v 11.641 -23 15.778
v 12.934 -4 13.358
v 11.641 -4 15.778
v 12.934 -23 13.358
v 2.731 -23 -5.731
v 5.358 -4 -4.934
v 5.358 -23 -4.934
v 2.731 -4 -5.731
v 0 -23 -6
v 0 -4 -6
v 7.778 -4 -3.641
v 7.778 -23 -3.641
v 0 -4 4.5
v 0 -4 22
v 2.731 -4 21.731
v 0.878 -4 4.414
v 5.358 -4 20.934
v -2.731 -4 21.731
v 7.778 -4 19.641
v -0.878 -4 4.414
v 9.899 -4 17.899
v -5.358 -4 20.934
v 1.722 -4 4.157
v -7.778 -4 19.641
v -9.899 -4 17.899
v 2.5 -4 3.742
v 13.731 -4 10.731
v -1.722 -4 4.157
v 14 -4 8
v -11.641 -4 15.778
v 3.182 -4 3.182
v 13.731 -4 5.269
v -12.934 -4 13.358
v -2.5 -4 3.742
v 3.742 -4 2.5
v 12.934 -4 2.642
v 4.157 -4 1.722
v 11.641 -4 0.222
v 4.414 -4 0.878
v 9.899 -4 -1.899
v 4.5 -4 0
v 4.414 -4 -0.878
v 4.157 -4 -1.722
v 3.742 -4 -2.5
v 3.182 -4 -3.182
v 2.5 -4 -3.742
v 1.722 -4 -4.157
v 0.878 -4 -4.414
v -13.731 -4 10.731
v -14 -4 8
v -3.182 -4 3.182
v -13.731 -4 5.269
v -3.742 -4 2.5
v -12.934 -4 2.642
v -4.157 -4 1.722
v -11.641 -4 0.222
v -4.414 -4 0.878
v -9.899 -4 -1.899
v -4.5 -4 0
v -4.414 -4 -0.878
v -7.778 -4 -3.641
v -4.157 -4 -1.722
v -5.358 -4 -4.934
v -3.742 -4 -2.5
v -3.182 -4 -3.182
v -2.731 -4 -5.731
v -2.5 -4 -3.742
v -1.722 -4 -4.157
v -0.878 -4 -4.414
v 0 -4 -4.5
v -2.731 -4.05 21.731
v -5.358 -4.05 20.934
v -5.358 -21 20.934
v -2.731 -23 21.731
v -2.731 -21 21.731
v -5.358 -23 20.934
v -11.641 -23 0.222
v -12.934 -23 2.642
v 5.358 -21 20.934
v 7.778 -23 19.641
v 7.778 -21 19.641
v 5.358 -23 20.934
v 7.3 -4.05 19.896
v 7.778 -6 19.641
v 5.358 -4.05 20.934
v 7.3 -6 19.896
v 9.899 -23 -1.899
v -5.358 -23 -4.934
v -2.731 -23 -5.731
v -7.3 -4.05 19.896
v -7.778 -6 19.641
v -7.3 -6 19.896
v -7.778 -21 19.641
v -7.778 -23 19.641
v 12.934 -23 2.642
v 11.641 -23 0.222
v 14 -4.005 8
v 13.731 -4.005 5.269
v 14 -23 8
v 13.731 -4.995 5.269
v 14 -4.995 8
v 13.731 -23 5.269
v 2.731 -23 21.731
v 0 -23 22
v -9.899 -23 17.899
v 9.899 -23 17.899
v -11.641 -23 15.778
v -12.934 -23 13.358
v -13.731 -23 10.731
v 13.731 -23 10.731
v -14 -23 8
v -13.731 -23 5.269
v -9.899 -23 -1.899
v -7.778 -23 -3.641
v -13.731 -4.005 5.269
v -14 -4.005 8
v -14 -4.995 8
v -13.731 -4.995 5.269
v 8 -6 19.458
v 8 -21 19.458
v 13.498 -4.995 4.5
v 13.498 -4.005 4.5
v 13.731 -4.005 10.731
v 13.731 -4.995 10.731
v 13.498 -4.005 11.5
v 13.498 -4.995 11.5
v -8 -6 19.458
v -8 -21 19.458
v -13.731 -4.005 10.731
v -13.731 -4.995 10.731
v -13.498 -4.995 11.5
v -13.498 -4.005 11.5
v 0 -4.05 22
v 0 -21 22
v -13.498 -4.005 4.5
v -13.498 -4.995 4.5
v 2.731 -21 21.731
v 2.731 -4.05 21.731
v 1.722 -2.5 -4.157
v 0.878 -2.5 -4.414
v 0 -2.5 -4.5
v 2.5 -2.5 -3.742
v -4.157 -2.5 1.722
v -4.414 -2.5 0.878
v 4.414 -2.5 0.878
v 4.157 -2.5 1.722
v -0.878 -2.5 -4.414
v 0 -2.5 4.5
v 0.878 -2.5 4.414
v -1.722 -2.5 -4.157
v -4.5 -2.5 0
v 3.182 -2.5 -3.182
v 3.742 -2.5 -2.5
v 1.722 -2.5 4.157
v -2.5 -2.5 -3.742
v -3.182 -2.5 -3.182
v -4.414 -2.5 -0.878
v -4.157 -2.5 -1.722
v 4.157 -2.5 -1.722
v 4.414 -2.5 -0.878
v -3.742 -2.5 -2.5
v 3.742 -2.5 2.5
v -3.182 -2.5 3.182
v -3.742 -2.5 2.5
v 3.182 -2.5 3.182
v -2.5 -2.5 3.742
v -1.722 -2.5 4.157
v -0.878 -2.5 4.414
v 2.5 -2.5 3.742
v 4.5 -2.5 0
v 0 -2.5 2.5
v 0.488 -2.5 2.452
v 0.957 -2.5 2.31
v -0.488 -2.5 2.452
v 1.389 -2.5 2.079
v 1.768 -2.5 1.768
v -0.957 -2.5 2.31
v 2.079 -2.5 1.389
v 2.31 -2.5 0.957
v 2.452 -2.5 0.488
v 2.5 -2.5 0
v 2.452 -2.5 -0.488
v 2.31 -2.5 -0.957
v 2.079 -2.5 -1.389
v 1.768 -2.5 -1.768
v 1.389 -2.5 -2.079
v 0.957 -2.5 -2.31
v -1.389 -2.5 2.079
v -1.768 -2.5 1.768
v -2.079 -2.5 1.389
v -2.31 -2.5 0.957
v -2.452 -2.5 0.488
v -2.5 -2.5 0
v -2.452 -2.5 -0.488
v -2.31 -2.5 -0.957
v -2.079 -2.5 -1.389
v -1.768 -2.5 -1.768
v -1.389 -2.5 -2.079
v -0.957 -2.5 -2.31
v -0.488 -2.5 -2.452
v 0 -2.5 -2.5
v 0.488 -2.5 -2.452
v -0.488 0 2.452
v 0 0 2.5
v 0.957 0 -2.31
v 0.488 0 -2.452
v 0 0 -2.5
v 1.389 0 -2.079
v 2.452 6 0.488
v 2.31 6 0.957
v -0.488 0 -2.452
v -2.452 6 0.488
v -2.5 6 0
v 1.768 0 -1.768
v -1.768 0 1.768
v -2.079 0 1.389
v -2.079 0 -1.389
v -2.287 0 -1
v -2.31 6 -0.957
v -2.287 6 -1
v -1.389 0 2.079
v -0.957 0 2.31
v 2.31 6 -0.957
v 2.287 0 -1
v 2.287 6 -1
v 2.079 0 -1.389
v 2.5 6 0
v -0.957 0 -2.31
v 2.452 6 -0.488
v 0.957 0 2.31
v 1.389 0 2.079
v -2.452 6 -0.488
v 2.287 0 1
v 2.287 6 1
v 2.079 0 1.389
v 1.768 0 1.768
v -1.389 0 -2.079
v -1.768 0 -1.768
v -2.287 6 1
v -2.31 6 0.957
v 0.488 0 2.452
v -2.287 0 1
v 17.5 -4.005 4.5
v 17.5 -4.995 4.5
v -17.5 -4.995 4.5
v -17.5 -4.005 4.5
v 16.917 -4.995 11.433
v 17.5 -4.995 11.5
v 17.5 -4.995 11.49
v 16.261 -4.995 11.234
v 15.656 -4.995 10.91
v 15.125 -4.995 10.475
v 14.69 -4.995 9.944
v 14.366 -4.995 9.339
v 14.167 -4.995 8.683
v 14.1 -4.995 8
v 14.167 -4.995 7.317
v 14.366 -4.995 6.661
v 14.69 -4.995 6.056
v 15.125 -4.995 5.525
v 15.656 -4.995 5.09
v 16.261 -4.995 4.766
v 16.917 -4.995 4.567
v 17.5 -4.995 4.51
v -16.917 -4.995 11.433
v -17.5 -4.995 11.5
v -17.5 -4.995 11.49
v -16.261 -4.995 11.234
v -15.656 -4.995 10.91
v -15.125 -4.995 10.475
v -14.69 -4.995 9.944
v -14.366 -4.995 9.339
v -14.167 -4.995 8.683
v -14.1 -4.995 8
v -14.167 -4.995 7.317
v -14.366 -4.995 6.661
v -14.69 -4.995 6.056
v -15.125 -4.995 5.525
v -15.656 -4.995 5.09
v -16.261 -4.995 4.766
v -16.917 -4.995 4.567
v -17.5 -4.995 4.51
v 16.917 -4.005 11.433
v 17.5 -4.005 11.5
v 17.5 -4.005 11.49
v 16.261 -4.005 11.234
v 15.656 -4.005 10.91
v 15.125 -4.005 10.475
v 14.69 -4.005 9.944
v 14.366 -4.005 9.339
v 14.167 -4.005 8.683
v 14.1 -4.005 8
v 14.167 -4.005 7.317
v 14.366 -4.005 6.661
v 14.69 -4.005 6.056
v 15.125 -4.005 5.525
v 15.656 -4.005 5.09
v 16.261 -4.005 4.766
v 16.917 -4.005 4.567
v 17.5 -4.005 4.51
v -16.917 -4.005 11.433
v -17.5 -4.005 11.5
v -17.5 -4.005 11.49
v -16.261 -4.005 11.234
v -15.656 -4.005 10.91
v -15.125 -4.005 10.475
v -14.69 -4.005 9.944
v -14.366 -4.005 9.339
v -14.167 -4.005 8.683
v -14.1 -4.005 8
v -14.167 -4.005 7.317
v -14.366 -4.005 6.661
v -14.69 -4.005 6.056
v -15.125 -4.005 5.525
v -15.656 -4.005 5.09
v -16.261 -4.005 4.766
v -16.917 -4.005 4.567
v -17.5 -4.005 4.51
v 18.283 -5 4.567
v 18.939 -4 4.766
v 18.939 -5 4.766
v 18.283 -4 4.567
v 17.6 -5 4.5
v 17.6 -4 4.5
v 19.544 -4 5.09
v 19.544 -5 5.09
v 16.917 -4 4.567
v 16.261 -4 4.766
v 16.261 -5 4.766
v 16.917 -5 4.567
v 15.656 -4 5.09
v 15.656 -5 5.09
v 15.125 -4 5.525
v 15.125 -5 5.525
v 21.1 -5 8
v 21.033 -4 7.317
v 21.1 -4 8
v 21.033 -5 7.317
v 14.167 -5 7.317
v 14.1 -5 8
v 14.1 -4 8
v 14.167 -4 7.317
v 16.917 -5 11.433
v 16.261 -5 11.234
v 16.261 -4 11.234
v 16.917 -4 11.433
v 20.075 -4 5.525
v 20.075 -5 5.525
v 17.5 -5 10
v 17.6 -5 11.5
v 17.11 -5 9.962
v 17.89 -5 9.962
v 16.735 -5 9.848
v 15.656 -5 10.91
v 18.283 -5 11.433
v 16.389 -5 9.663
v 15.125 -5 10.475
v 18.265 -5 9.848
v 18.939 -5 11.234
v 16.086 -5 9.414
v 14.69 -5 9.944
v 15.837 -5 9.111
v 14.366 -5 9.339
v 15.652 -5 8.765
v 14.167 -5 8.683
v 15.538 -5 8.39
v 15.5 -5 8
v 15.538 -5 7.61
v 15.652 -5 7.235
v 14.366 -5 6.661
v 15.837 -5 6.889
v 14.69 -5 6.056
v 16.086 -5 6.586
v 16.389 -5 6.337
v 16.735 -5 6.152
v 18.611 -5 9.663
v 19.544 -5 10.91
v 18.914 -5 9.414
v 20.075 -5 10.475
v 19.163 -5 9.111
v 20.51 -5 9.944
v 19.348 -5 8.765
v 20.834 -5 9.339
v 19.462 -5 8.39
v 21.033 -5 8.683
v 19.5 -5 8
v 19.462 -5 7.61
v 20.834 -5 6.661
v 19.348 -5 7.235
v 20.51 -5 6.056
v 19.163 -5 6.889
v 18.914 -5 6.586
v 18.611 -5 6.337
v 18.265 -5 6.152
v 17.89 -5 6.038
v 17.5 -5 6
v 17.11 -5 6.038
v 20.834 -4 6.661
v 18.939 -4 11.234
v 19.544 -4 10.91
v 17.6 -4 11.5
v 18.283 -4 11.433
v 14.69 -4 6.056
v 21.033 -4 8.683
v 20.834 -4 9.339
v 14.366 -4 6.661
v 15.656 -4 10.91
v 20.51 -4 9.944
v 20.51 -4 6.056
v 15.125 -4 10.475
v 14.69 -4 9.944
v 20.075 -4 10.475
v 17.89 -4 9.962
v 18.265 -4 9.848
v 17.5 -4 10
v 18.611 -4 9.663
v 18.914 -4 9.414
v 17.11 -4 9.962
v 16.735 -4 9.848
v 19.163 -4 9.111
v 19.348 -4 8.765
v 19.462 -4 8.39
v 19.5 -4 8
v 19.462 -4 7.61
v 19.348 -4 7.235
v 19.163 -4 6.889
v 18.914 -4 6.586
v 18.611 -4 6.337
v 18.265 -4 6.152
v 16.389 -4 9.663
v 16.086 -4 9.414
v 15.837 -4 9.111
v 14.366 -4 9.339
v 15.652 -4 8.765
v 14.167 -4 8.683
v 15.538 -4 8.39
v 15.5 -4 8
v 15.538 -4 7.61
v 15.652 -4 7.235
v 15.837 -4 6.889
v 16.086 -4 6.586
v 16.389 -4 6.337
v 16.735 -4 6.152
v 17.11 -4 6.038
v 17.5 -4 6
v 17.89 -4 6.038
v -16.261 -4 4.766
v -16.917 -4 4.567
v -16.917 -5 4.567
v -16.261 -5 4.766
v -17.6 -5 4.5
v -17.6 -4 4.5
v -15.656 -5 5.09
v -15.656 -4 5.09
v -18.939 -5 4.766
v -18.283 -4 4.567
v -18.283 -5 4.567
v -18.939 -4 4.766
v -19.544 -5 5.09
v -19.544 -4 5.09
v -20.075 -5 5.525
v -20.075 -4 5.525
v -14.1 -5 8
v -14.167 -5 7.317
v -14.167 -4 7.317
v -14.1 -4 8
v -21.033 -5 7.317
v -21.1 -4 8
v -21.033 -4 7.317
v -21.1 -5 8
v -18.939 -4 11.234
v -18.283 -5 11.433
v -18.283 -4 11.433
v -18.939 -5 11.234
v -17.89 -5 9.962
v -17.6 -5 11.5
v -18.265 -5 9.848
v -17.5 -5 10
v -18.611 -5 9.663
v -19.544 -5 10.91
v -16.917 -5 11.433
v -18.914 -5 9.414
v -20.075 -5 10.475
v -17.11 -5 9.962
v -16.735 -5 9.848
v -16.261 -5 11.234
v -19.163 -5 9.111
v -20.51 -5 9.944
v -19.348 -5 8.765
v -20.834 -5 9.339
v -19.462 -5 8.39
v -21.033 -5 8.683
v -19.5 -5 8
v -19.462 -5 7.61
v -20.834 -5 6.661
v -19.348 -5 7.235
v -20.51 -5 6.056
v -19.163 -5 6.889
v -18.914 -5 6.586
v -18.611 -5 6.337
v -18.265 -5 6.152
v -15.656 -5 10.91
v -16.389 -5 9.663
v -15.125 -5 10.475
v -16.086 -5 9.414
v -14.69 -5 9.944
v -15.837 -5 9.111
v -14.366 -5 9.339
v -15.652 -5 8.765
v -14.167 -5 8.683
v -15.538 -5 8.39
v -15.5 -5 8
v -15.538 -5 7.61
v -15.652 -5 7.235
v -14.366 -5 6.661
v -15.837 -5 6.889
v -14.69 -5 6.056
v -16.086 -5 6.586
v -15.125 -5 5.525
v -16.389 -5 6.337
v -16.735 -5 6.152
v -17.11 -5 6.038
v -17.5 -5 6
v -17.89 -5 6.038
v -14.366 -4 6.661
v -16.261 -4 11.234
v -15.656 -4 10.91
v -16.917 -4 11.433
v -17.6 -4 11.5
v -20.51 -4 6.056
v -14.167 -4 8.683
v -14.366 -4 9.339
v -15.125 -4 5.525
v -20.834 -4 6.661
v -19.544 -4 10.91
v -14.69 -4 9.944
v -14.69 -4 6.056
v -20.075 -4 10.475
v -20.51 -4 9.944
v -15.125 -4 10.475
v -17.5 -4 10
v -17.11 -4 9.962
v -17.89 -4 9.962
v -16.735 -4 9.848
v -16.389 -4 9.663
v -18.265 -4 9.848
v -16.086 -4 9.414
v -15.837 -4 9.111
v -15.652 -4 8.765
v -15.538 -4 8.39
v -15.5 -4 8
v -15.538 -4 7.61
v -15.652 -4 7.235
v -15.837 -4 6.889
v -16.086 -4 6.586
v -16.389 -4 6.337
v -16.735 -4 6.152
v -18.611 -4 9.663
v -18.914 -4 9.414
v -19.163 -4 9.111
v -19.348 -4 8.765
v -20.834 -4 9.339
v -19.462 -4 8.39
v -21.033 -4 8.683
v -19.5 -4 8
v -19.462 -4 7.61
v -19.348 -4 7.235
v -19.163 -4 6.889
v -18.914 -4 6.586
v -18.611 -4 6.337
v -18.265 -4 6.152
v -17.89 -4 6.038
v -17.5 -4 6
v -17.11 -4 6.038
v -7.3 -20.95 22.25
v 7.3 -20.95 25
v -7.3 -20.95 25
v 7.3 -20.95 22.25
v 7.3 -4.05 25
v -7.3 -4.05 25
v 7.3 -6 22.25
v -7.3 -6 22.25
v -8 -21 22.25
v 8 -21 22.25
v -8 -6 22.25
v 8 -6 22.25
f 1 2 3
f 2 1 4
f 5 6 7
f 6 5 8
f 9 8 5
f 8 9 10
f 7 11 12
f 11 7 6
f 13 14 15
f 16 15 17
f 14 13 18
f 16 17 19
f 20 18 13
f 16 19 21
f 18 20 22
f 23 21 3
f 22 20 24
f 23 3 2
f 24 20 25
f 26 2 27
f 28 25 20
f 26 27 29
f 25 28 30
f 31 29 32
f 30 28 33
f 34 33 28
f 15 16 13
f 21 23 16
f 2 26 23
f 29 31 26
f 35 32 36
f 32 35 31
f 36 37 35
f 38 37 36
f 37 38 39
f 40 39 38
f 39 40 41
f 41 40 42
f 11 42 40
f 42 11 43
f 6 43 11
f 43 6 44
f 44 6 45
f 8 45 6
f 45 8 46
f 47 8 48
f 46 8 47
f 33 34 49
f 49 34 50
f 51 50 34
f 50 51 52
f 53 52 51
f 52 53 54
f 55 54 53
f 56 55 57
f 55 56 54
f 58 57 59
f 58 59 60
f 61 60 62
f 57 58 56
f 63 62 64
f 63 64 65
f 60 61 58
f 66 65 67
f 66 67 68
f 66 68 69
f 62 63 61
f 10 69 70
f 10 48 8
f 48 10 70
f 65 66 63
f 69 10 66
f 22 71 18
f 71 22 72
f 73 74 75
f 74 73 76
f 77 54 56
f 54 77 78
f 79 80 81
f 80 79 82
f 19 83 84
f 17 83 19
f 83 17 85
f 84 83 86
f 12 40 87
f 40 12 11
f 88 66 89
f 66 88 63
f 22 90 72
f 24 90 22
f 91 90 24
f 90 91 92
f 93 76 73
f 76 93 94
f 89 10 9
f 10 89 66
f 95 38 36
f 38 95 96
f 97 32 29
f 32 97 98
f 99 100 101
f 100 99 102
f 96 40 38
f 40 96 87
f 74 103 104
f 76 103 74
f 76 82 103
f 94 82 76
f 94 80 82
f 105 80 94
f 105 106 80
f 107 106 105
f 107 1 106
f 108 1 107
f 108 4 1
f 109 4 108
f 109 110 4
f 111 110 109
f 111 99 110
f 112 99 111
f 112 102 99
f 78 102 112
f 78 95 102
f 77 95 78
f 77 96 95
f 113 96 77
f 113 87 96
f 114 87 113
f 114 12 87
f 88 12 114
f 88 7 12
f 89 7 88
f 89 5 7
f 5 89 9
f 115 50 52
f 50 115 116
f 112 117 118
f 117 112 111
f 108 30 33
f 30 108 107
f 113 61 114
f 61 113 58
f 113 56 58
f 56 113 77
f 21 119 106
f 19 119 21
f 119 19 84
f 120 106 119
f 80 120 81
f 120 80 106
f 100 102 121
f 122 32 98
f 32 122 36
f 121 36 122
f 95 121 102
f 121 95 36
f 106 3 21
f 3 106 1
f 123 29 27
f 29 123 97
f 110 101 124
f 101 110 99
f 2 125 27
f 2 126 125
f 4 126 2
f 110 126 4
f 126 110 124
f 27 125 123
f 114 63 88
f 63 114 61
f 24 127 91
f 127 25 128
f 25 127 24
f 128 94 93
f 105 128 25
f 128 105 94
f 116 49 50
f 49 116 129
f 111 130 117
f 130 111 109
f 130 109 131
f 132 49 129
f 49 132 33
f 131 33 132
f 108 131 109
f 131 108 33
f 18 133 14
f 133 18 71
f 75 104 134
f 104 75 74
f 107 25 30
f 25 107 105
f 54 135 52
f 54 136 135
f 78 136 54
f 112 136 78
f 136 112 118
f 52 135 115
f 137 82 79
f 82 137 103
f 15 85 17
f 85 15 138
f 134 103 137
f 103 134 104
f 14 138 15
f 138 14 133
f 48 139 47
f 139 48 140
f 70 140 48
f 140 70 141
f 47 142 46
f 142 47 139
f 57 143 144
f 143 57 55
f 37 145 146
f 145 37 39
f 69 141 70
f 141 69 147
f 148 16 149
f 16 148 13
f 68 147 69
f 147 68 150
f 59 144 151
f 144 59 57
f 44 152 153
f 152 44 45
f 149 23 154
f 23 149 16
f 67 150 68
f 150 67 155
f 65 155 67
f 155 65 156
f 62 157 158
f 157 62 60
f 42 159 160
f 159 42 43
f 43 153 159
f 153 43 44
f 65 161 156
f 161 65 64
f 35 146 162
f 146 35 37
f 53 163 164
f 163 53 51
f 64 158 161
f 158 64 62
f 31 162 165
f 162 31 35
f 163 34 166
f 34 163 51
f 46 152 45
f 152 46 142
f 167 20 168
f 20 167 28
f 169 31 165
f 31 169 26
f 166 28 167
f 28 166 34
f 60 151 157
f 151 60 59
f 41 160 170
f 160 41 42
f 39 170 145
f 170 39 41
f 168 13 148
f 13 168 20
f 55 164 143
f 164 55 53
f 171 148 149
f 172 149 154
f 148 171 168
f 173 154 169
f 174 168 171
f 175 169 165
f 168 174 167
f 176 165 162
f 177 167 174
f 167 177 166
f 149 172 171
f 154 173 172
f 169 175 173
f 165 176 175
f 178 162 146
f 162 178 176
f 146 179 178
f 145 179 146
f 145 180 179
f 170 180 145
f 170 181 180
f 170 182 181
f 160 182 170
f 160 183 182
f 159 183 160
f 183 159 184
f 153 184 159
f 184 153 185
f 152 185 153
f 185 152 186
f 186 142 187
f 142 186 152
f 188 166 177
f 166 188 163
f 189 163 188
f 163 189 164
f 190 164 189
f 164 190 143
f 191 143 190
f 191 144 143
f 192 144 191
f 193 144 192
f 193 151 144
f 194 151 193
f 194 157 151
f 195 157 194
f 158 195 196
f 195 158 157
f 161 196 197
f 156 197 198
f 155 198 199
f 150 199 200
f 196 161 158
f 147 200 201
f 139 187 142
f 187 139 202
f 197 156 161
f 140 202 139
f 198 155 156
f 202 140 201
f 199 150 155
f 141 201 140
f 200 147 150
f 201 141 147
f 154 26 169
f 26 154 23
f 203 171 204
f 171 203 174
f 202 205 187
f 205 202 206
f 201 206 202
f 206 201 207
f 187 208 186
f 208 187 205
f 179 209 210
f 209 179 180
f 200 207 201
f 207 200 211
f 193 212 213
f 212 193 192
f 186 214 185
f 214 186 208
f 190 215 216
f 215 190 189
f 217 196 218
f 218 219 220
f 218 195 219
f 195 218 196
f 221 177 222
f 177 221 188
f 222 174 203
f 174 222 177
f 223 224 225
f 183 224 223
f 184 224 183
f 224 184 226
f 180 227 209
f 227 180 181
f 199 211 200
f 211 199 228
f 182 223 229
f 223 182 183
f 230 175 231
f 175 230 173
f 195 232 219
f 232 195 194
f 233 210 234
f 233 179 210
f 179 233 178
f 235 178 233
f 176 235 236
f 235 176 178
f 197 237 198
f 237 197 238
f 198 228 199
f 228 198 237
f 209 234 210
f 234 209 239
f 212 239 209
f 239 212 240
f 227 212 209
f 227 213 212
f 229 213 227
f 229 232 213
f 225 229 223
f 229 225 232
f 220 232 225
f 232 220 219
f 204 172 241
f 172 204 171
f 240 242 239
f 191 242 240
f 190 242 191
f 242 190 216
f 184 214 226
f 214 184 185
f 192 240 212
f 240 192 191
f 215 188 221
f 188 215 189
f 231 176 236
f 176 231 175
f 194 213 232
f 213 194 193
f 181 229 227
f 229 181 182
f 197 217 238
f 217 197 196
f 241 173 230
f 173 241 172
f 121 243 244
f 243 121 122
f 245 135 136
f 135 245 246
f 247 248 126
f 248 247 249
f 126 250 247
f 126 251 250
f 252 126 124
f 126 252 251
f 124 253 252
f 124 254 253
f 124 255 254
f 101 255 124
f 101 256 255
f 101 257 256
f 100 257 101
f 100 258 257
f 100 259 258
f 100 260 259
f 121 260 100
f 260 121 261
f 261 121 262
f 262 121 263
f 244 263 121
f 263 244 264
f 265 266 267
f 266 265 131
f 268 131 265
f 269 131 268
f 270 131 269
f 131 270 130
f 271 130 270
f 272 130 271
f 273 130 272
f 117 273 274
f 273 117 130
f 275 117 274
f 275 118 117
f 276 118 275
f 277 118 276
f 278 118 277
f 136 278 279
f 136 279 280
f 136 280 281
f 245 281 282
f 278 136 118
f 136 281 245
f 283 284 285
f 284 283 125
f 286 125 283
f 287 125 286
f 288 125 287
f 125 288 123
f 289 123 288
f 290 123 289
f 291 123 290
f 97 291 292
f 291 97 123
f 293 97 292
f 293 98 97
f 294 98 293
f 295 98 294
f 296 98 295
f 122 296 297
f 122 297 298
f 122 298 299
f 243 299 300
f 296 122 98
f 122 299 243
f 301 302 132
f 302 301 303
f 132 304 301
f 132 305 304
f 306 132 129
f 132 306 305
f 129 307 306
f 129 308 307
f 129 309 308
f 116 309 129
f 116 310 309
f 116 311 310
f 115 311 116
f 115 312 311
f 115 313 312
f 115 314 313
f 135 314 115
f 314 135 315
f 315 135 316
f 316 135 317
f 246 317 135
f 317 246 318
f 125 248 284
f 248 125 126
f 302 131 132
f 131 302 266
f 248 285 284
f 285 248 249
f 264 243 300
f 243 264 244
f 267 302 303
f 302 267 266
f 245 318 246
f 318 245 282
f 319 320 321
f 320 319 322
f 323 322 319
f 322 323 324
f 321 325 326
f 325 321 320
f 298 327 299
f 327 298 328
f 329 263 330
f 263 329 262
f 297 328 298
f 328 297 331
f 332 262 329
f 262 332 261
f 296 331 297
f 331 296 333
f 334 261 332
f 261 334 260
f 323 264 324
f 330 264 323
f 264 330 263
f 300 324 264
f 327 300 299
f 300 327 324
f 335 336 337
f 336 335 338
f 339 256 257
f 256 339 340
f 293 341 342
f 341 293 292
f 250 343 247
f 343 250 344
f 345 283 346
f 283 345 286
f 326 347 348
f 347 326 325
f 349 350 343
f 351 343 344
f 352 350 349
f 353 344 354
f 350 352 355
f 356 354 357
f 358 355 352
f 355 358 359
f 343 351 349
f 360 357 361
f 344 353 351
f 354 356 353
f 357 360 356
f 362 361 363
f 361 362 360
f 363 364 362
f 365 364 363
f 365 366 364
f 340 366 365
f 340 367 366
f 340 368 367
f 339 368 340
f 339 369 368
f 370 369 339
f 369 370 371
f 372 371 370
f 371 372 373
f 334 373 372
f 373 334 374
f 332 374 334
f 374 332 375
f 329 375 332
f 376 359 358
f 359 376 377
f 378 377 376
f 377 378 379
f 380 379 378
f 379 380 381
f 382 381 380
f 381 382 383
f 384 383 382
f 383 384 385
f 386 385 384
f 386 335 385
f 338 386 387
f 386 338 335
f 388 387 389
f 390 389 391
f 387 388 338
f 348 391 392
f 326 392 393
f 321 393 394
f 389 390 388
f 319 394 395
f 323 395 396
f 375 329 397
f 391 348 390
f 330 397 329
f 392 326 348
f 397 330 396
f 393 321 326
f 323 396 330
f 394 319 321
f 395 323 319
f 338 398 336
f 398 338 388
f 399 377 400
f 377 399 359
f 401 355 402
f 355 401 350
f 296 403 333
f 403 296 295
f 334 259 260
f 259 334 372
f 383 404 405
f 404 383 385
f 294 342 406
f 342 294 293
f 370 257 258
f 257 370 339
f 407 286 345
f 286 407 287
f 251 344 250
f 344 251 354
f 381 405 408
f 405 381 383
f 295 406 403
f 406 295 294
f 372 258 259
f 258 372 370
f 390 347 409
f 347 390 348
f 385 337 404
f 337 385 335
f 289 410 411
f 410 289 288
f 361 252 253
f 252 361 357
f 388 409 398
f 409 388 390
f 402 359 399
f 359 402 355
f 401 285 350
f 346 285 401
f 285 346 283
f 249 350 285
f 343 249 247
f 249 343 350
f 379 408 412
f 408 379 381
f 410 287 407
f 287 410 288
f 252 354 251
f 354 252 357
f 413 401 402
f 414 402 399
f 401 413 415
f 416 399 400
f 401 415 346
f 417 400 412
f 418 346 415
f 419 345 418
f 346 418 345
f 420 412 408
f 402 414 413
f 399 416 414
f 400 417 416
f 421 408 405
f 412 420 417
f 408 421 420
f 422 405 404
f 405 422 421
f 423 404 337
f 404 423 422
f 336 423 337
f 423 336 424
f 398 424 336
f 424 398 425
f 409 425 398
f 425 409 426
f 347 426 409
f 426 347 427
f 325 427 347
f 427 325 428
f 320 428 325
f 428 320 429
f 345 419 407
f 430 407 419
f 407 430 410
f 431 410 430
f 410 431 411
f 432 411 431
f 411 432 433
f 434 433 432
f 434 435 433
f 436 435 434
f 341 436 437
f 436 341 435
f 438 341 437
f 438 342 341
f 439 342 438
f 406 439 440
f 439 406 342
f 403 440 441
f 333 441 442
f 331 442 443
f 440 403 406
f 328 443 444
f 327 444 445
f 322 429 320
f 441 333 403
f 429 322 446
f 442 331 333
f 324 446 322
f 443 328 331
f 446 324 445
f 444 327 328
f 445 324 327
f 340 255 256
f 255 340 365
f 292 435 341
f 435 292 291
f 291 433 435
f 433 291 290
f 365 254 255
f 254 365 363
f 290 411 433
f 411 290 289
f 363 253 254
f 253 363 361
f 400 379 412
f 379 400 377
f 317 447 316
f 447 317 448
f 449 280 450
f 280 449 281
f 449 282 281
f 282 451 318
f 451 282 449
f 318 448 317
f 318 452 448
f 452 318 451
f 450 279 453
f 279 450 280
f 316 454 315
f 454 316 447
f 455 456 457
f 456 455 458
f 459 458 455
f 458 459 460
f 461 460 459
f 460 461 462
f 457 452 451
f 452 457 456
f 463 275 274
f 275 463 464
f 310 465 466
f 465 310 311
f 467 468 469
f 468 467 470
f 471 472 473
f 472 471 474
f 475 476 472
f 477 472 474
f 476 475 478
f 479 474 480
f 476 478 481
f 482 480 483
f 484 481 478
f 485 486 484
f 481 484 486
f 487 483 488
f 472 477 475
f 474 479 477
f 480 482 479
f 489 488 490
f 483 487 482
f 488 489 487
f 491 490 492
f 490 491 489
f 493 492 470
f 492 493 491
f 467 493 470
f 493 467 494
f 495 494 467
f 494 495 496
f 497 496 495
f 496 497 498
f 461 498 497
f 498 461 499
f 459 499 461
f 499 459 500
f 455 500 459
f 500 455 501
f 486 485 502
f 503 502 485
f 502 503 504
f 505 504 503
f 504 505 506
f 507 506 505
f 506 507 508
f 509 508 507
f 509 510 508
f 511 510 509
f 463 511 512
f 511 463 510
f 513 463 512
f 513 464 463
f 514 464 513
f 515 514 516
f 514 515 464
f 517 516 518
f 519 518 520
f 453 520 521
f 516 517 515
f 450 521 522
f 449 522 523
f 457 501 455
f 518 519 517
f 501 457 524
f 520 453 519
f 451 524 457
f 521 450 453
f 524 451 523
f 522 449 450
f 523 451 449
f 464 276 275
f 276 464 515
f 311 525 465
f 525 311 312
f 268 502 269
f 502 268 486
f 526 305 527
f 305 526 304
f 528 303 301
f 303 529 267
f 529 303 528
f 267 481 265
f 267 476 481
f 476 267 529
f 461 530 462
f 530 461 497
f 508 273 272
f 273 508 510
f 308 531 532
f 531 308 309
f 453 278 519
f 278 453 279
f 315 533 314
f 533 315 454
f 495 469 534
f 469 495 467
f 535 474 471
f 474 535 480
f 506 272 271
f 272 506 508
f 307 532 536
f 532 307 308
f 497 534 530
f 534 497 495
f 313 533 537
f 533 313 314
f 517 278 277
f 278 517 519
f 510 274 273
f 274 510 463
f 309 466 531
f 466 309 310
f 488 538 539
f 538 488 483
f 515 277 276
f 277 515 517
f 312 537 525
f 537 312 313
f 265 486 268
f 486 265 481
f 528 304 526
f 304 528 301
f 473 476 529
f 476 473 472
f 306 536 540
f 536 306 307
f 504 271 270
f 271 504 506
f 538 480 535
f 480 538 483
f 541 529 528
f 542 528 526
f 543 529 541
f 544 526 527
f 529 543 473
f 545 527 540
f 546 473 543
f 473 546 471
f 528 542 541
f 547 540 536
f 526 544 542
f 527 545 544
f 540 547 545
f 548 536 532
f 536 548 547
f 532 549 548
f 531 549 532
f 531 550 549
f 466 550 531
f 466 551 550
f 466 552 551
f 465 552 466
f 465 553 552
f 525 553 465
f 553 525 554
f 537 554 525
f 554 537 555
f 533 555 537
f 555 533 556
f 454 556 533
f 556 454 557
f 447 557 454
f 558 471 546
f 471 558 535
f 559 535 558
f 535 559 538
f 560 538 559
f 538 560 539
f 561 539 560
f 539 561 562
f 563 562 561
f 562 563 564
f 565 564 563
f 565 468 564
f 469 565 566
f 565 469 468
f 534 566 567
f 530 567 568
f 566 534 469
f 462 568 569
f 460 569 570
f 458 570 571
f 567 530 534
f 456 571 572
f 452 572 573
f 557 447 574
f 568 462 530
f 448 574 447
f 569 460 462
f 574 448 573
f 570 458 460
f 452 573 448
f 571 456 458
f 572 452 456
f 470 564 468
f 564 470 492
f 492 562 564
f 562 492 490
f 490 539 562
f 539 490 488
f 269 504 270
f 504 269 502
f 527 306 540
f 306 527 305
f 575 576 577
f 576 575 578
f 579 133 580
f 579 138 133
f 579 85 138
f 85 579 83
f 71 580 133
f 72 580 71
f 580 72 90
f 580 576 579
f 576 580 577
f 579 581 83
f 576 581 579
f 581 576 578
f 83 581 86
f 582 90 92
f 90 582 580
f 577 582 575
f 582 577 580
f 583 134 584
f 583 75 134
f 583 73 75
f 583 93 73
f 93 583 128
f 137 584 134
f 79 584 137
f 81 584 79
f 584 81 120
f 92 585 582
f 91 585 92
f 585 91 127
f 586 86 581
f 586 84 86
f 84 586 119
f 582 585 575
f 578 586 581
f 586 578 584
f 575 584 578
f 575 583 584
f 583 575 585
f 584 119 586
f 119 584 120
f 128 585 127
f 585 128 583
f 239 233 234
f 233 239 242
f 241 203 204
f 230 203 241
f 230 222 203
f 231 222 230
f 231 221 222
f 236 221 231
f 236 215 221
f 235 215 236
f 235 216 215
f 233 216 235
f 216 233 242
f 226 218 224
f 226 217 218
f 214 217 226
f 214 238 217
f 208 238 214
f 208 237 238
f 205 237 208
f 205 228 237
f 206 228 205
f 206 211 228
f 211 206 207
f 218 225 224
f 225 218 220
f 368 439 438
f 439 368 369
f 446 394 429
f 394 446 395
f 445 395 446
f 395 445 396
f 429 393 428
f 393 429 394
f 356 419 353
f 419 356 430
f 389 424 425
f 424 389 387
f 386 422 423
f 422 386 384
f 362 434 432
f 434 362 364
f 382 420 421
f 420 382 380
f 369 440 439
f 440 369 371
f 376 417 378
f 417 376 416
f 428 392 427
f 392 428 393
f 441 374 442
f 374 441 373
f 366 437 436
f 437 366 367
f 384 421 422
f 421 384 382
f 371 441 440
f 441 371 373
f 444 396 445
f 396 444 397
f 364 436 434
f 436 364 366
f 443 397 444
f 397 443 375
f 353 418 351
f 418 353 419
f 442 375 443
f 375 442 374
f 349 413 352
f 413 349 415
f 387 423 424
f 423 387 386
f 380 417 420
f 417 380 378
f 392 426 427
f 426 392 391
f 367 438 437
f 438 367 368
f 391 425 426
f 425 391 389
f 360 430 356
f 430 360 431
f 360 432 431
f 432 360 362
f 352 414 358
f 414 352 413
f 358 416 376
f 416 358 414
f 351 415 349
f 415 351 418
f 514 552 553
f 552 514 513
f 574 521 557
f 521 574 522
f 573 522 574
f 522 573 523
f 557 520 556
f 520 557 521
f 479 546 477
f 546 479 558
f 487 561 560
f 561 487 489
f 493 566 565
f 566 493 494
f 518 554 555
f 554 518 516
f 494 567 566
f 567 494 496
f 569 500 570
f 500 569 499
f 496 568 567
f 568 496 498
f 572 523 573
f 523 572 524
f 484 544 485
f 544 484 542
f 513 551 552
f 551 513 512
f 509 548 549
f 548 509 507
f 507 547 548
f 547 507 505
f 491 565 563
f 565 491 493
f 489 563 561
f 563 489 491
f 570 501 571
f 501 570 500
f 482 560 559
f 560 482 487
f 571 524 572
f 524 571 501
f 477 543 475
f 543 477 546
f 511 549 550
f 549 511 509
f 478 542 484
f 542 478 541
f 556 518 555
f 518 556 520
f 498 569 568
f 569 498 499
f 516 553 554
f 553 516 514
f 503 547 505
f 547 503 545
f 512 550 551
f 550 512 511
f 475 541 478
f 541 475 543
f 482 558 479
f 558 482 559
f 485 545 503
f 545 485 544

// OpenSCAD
module StepMotor28BYJ()
rotate([0,90,-90]) translate([-8,0,16.55-6.1/2]) 
{
difference(){
    union(){
        color("gray") cylinder(h = 19, r = 14, center = true, $fn = 32);
        color("gray") translate([8,0,-1.5])	cylinder(h = 19, r = 4.5, center = true, $fn = 32);
        color("gold") translate([8,0,-10])	cylinder(h = 19, r = 2.5, center = true, $fn = 32);
        
        
        color("Silver") translate([0,0,-9]) cube([7,35,0.99], center = true);				
        color("Silver") translate([0,17.6,-9])	cylinder(h = 1, r = 3.5, center = true, $fn = 32);
        
        color("Silver") translate([0,-17.6,-9])	cylinder(h = 1, r = 3.5, center = true, $fn = 32);
        

        color("blue") translate([-3,0,-1]) cube([28,14.6,16.9], center = true);
        color("blue") translate([-2,0,0])  cube([24.5,16,15], center = true);
    }
    // handle
    color("red") translate([5,0,-16.55]) cube([4,5,6.1], center = true);   
    color("red") translate([11,0,-16.55]) cube([4,5,6.1], center = true);
    // screw holes
    color("red") translate([0,17.5,-9])	    cylinder(h = 2, r = 2, center = true, $fn = 32);
    color("red") translate([0,-17.5,-9])	cylinder(h = 2, r = 2, center = true, $fn = 32);
}
}
StepMotor28BYJ();
